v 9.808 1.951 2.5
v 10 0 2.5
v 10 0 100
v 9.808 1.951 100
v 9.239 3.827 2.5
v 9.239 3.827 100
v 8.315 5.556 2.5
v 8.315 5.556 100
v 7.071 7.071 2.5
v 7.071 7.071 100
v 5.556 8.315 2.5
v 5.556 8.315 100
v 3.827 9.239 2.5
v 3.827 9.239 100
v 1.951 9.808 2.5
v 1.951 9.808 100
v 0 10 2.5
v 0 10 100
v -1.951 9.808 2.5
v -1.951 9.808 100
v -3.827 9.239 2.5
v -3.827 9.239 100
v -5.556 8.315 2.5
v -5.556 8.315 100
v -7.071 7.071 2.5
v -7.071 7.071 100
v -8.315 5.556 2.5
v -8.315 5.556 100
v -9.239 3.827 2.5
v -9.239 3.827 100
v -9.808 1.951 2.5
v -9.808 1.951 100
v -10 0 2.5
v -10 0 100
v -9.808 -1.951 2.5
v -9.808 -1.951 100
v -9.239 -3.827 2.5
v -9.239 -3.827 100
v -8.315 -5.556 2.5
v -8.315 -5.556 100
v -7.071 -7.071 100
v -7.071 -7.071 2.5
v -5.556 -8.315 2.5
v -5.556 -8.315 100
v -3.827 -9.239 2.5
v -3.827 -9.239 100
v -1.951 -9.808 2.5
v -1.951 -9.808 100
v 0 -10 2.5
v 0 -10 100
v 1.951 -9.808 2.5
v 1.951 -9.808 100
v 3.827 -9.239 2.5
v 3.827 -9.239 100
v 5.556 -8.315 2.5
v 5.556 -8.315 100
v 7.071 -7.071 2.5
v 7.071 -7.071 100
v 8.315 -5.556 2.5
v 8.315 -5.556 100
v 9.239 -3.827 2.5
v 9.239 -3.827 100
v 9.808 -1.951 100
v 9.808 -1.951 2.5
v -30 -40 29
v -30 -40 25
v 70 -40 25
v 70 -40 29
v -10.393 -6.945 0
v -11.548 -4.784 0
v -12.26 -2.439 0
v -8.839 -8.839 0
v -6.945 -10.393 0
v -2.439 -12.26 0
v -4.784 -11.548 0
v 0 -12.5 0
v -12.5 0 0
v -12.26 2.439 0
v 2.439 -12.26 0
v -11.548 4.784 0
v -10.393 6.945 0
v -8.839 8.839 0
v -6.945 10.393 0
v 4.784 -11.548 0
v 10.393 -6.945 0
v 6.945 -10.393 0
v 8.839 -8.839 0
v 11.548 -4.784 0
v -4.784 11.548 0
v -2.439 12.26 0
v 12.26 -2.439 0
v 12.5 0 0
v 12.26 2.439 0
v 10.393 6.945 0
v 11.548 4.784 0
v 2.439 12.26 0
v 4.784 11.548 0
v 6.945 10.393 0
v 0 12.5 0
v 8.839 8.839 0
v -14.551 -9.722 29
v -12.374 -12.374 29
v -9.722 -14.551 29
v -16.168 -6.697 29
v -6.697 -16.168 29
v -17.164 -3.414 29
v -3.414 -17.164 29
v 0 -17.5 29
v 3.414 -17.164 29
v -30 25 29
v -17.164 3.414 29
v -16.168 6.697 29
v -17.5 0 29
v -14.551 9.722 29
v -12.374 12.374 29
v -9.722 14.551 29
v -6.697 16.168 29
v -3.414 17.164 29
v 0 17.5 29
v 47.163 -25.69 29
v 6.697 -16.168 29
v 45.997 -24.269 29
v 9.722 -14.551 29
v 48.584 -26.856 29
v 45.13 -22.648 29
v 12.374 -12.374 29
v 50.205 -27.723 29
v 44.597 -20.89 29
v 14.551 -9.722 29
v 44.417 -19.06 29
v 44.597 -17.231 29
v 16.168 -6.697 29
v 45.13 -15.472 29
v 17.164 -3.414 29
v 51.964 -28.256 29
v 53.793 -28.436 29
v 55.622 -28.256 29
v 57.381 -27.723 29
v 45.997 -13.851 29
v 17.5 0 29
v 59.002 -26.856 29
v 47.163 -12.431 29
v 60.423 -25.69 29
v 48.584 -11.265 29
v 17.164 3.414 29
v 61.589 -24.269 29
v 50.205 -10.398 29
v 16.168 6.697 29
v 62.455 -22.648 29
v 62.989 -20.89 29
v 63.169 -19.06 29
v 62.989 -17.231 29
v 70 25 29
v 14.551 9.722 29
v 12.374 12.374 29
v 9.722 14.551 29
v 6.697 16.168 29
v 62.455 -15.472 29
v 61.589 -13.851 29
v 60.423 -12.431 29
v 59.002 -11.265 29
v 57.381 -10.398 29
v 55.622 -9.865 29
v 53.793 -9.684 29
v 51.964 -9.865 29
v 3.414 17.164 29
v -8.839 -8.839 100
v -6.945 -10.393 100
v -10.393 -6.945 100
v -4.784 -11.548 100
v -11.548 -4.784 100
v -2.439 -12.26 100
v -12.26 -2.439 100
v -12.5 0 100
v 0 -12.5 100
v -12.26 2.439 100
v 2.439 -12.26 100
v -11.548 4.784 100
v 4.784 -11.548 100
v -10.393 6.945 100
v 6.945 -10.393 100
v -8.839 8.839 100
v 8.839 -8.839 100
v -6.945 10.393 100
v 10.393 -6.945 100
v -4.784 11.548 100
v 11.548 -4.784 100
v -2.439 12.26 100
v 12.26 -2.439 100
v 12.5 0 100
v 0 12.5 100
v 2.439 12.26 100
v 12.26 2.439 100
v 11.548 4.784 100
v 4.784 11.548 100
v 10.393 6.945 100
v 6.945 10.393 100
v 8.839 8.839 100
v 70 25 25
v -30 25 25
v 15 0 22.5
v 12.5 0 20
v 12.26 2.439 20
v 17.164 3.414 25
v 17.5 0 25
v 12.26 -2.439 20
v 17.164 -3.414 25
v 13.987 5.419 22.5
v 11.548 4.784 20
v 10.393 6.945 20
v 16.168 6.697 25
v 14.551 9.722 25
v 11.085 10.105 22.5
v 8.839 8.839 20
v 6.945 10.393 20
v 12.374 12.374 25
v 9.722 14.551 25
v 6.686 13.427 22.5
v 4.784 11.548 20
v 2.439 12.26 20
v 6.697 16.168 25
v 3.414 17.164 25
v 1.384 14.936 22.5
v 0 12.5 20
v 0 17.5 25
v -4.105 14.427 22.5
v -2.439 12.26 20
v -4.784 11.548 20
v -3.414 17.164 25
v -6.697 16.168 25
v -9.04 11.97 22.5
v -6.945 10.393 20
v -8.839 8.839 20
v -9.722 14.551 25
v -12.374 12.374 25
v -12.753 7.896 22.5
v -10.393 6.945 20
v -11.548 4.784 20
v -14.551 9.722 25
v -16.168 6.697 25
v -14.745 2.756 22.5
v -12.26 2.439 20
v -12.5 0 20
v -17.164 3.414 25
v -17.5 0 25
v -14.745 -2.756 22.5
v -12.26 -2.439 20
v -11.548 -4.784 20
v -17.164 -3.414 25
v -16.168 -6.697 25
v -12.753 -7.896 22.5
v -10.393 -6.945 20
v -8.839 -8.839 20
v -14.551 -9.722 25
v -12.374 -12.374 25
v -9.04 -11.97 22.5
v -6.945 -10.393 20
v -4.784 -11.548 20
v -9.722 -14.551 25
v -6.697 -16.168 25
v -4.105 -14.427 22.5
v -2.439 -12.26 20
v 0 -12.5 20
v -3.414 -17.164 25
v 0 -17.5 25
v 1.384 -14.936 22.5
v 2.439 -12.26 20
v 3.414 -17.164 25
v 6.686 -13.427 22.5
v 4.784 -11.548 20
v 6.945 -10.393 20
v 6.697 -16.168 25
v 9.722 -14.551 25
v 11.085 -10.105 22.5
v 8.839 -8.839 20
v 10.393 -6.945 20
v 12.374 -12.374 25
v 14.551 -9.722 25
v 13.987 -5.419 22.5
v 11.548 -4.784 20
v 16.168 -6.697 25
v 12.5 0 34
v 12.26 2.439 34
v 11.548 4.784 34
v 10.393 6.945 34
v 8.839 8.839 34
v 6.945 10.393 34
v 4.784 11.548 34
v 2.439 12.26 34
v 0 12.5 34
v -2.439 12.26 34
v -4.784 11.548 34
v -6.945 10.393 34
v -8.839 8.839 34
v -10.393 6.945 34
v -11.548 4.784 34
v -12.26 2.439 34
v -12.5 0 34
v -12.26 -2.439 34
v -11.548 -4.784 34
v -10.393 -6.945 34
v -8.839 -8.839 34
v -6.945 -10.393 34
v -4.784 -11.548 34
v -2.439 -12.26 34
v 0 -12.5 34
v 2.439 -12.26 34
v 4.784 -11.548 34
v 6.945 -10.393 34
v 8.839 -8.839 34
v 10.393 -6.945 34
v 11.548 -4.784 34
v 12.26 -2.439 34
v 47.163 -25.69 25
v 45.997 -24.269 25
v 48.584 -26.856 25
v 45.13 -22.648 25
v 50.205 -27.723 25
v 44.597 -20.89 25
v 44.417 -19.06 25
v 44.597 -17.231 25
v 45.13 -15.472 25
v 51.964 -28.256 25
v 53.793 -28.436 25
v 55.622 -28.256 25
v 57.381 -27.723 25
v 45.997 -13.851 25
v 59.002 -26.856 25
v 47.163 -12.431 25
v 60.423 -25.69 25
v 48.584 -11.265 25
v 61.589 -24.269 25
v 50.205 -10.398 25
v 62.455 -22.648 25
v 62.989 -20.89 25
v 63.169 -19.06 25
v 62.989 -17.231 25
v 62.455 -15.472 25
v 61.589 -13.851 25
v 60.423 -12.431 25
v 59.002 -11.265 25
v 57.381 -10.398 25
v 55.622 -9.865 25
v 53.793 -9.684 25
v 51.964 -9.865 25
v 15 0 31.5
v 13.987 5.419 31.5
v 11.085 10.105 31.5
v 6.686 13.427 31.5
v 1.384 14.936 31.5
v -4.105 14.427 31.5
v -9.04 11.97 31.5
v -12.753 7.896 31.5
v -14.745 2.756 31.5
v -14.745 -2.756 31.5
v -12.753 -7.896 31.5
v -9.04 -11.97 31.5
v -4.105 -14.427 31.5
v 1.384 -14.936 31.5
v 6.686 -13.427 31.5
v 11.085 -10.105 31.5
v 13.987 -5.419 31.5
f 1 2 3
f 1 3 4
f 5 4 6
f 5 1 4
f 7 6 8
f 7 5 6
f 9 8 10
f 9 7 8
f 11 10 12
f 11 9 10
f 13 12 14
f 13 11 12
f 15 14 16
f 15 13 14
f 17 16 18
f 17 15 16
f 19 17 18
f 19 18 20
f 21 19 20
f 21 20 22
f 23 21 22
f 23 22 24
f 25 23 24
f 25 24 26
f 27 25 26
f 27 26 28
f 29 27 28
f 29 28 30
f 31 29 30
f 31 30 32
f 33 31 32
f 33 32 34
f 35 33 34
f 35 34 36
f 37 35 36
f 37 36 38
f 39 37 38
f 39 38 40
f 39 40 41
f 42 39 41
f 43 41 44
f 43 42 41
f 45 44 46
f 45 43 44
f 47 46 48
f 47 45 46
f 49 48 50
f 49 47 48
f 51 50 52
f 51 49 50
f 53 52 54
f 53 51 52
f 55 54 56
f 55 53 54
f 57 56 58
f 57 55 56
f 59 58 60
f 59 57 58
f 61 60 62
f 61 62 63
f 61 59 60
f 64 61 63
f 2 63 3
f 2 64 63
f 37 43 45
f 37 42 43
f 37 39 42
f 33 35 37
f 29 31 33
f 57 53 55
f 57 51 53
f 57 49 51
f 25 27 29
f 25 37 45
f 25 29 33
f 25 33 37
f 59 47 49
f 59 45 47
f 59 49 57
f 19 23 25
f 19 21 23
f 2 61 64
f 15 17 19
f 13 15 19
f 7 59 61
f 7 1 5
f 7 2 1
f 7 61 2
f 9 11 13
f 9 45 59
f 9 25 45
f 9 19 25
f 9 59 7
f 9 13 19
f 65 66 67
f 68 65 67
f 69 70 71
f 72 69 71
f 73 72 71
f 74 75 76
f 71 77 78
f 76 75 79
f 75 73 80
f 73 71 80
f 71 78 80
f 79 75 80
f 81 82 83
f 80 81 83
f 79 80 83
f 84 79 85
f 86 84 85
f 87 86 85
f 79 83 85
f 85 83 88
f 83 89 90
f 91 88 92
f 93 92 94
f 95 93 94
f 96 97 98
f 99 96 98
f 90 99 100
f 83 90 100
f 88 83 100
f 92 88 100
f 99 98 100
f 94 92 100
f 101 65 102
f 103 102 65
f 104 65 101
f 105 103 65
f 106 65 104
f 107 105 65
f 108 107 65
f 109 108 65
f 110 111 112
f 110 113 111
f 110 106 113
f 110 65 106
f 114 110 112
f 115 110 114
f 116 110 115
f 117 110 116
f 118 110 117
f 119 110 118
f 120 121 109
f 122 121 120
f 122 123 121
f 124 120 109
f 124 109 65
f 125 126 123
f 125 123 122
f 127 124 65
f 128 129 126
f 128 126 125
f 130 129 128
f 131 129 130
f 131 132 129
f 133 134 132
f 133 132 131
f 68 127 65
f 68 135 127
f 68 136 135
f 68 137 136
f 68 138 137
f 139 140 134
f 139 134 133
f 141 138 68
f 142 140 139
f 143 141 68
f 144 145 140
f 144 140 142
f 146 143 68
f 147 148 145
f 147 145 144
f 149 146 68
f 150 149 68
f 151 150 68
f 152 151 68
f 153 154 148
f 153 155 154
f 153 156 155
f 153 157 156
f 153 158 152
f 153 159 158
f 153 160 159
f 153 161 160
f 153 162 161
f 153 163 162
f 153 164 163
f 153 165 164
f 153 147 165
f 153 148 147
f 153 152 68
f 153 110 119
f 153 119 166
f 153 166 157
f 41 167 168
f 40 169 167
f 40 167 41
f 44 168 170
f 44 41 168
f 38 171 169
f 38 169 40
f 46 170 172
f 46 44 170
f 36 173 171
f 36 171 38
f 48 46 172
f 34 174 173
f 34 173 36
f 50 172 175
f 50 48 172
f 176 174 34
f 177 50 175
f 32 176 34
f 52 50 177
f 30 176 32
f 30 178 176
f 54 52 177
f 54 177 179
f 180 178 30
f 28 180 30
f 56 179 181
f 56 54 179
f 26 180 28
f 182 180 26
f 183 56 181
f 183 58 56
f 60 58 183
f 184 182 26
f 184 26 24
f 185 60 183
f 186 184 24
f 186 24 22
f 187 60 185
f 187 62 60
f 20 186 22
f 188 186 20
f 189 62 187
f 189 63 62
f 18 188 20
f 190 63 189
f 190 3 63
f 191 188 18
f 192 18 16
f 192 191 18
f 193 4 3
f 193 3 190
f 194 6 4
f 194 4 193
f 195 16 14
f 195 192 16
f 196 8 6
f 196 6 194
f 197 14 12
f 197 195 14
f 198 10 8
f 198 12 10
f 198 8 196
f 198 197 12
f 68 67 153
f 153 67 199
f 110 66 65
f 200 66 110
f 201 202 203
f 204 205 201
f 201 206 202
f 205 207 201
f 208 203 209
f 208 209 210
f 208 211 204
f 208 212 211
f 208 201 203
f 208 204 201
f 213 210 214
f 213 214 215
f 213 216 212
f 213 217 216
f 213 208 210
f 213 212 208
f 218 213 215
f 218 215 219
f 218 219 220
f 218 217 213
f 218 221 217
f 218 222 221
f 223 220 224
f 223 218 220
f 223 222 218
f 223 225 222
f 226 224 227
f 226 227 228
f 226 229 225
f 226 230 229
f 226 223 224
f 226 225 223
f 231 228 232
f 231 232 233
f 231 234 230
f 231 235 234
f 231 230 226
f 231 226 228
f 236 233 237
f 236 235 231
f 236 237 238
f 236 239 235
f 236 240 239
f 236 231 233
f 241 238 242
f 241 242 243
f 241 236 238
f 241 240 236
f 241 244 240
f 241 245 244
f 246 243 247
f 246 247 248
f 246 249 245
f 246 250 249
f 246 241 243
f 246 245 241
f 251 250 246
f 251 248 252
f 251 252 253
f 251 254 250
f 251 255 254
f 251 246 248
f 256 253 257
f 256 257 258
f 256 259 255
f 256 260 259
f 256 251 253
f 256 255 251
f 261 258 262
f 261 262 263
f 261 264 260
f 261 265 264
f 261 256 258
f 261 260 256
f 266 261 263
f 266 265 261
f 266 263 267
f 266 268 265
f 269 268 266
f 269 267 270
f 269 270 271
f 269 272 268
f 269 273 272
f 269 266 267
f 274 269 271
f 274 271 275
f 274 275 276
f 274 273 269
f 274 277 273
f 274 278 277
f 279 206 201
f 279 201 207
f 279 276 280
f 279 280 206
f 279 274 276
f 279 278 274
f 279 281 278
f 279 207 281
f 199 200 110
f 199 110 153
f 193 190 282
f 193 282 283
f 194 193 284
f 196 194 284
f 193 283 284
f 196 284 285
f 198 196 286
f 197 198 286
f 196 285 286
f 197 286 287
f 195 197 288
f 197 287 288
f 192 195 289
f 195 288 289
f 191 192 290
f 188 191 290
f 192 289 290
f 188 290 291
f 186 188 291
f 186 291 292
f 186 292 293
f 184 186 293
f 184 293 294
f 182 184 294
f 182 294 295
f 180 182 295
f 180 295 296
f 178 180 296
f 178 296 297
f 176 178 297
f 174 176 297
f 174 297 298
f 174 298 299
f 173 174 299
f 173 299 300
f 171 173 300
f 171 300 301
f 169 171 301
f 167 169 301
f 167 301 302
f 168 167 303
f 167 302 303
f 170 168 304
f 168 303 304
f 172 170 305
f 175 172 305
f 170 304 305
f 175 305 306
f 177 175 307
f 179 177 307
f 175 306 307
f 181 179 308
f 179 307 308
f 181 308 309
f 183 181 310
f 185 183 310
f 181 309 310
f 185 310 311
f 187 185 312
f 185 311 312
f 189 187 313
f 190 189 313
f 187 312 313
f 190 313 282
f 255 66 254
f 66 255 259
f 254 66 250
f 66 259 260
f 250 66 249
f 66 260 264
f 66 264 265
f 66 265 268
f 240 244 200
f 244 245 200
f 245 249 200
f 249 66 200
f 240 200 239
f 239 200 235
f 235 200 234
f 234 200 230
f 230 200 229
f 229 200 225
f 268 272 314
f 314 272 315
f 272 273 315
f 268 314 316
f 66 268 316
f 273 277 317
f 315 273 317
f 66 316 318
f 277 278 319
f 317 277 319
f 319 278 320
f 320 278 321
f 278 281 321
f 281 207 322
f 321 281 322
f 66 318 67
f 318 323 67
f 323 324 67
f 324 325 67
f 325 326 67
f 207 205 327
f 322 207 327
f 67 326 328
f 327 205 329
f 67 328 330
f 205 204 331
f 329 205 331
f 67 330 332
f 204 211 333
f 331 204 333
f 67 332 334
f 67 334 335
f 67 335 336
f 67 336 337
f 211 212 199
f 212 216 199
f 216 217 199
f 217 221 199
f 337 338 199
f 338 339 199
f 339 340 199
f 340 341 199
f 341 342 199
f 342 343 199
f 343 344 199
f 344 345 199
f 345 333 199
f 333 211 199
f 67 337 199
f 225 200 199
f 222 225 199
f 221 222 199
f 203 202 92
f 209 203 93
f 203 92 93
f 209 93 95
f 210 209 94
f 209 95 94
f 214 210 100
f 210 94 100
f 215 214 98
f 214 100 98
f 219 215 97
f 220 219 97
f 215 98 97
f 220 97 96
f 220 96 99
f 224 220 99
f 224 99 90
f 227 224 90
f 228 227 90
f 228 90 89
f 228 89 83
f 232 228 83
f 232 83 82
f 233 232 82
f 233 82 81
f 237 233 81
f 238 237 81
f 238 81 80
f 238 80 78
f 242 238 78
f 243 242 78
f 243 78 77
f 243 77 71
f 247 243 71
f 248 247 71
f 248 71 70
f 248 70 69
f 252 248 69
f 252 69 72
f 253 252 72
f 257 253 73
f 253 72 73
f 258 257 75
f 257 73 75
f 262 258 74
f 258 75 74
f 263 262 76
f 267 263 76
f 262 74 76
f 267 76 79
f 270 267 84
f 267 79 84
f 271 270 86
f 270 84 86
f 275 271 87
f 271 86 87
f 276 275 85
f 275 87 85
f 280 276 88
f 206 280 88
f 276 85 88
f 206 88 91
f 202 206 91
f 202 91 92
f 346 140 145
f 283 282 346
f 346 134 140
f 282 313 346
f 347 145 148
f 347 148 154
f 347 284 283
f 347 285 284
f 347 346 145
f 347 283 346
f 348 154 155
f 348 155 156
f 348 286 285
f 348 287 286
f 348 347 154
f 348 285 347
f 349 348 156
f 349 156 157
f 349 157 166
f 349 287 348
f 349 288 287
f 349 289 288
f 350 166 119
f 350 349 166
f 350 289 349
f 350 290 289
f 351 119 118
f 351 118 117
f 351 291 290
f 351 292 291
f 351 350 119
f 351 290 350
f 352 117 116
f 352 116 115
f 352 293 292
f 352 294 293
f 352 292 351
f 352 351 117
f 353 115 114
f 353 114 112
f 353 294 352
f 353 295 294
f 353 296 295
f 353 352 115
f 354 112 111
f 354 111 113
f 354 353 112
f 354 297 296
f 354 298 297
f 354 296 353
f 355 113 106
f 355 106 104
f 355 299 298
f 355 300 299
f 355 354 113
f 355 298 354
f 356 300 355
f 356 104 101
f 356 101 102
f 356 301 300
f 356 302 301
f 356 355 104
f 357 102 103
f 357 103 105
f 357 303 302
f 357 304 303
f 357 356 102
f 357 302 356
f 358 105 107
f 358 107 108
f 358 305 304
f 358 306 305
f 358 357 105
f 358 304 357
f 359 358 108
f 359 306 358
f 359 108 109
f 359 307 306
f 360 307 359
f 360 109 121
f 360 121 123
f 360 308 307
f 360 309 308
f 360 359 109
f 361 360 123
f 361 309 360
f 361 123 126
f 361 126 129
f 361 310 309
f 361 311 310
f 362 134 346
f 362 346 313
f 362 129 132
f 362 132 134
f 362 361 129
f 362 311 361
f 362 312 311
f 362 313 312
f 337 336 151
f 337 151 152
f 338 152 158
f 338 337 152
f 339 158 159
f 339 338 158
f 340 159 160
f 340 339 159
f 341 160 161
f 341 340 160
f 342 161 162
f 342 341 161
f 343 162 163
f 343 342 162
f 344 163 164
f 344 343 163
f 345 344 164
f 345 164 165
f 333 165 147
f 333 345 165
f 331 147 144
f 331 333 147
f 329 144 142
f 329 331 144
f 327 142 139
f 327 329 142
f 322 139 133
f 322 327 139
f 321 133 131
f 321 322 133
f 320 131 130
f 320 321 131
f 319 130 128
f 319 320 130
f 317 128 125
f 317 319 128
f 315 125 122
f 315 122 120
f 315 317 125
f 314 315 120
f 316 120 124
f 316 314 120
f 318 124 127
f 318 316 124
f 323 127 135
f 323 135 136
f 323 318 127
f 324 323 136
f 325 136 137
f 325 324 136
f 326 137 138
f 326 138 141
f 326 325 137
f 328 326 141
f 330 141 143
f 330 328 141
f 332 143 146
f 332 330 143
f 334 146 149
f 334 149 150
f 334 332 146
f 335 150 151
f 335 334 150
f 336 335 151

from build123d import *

# Parameters (mm, degrees)
F0_R     = 12.5
F1_DEPTH = 100
F2_T     = -2.5
F4_W     = 100
F4_H     = 65
F4_R     = 9.376015
F4_R_2   = 12.5
F5_DEPTH = 4
F6_SIZE  = 5


with BuildPart() as f1:
    # F0 (on Top) → F1 (new body)
    with BuildSketch(Plane.XY):
        Circle(F0_R)
    extrude(amount=F1_DEPTH)

    # F2
    f2_openings = [f1.faces().sort_by_distance(p)[0] for p in [
        (0, 0, 100),
    ]]
    offset(amount=F2_T, openings=f2_openings)

    # F4 (on offset) → F5 (join)
    with BuildSketch(Plane.XY.offset(25)):
        with Locations((20, -7.5)):
            Rectangle(F4_W, F4_H)
        with Locations((53.792767, -19.060429)):
            Circle(F4_R, mode=Mode.SUBTRACT)
        Circle(F4_R_2, mode=Mode.SUBTRACT)
    extrude(amount=F5_DEPTH)

    # F6
    f6_edges = [f1.edges().sort_by_distance(p)[0] for p in [
        (-12.5, 0, 29),
        (-12.5, 0, 25),
    ]]
    chamfer(f6_edges, length=F6_SIZE)


solid = f1.part
